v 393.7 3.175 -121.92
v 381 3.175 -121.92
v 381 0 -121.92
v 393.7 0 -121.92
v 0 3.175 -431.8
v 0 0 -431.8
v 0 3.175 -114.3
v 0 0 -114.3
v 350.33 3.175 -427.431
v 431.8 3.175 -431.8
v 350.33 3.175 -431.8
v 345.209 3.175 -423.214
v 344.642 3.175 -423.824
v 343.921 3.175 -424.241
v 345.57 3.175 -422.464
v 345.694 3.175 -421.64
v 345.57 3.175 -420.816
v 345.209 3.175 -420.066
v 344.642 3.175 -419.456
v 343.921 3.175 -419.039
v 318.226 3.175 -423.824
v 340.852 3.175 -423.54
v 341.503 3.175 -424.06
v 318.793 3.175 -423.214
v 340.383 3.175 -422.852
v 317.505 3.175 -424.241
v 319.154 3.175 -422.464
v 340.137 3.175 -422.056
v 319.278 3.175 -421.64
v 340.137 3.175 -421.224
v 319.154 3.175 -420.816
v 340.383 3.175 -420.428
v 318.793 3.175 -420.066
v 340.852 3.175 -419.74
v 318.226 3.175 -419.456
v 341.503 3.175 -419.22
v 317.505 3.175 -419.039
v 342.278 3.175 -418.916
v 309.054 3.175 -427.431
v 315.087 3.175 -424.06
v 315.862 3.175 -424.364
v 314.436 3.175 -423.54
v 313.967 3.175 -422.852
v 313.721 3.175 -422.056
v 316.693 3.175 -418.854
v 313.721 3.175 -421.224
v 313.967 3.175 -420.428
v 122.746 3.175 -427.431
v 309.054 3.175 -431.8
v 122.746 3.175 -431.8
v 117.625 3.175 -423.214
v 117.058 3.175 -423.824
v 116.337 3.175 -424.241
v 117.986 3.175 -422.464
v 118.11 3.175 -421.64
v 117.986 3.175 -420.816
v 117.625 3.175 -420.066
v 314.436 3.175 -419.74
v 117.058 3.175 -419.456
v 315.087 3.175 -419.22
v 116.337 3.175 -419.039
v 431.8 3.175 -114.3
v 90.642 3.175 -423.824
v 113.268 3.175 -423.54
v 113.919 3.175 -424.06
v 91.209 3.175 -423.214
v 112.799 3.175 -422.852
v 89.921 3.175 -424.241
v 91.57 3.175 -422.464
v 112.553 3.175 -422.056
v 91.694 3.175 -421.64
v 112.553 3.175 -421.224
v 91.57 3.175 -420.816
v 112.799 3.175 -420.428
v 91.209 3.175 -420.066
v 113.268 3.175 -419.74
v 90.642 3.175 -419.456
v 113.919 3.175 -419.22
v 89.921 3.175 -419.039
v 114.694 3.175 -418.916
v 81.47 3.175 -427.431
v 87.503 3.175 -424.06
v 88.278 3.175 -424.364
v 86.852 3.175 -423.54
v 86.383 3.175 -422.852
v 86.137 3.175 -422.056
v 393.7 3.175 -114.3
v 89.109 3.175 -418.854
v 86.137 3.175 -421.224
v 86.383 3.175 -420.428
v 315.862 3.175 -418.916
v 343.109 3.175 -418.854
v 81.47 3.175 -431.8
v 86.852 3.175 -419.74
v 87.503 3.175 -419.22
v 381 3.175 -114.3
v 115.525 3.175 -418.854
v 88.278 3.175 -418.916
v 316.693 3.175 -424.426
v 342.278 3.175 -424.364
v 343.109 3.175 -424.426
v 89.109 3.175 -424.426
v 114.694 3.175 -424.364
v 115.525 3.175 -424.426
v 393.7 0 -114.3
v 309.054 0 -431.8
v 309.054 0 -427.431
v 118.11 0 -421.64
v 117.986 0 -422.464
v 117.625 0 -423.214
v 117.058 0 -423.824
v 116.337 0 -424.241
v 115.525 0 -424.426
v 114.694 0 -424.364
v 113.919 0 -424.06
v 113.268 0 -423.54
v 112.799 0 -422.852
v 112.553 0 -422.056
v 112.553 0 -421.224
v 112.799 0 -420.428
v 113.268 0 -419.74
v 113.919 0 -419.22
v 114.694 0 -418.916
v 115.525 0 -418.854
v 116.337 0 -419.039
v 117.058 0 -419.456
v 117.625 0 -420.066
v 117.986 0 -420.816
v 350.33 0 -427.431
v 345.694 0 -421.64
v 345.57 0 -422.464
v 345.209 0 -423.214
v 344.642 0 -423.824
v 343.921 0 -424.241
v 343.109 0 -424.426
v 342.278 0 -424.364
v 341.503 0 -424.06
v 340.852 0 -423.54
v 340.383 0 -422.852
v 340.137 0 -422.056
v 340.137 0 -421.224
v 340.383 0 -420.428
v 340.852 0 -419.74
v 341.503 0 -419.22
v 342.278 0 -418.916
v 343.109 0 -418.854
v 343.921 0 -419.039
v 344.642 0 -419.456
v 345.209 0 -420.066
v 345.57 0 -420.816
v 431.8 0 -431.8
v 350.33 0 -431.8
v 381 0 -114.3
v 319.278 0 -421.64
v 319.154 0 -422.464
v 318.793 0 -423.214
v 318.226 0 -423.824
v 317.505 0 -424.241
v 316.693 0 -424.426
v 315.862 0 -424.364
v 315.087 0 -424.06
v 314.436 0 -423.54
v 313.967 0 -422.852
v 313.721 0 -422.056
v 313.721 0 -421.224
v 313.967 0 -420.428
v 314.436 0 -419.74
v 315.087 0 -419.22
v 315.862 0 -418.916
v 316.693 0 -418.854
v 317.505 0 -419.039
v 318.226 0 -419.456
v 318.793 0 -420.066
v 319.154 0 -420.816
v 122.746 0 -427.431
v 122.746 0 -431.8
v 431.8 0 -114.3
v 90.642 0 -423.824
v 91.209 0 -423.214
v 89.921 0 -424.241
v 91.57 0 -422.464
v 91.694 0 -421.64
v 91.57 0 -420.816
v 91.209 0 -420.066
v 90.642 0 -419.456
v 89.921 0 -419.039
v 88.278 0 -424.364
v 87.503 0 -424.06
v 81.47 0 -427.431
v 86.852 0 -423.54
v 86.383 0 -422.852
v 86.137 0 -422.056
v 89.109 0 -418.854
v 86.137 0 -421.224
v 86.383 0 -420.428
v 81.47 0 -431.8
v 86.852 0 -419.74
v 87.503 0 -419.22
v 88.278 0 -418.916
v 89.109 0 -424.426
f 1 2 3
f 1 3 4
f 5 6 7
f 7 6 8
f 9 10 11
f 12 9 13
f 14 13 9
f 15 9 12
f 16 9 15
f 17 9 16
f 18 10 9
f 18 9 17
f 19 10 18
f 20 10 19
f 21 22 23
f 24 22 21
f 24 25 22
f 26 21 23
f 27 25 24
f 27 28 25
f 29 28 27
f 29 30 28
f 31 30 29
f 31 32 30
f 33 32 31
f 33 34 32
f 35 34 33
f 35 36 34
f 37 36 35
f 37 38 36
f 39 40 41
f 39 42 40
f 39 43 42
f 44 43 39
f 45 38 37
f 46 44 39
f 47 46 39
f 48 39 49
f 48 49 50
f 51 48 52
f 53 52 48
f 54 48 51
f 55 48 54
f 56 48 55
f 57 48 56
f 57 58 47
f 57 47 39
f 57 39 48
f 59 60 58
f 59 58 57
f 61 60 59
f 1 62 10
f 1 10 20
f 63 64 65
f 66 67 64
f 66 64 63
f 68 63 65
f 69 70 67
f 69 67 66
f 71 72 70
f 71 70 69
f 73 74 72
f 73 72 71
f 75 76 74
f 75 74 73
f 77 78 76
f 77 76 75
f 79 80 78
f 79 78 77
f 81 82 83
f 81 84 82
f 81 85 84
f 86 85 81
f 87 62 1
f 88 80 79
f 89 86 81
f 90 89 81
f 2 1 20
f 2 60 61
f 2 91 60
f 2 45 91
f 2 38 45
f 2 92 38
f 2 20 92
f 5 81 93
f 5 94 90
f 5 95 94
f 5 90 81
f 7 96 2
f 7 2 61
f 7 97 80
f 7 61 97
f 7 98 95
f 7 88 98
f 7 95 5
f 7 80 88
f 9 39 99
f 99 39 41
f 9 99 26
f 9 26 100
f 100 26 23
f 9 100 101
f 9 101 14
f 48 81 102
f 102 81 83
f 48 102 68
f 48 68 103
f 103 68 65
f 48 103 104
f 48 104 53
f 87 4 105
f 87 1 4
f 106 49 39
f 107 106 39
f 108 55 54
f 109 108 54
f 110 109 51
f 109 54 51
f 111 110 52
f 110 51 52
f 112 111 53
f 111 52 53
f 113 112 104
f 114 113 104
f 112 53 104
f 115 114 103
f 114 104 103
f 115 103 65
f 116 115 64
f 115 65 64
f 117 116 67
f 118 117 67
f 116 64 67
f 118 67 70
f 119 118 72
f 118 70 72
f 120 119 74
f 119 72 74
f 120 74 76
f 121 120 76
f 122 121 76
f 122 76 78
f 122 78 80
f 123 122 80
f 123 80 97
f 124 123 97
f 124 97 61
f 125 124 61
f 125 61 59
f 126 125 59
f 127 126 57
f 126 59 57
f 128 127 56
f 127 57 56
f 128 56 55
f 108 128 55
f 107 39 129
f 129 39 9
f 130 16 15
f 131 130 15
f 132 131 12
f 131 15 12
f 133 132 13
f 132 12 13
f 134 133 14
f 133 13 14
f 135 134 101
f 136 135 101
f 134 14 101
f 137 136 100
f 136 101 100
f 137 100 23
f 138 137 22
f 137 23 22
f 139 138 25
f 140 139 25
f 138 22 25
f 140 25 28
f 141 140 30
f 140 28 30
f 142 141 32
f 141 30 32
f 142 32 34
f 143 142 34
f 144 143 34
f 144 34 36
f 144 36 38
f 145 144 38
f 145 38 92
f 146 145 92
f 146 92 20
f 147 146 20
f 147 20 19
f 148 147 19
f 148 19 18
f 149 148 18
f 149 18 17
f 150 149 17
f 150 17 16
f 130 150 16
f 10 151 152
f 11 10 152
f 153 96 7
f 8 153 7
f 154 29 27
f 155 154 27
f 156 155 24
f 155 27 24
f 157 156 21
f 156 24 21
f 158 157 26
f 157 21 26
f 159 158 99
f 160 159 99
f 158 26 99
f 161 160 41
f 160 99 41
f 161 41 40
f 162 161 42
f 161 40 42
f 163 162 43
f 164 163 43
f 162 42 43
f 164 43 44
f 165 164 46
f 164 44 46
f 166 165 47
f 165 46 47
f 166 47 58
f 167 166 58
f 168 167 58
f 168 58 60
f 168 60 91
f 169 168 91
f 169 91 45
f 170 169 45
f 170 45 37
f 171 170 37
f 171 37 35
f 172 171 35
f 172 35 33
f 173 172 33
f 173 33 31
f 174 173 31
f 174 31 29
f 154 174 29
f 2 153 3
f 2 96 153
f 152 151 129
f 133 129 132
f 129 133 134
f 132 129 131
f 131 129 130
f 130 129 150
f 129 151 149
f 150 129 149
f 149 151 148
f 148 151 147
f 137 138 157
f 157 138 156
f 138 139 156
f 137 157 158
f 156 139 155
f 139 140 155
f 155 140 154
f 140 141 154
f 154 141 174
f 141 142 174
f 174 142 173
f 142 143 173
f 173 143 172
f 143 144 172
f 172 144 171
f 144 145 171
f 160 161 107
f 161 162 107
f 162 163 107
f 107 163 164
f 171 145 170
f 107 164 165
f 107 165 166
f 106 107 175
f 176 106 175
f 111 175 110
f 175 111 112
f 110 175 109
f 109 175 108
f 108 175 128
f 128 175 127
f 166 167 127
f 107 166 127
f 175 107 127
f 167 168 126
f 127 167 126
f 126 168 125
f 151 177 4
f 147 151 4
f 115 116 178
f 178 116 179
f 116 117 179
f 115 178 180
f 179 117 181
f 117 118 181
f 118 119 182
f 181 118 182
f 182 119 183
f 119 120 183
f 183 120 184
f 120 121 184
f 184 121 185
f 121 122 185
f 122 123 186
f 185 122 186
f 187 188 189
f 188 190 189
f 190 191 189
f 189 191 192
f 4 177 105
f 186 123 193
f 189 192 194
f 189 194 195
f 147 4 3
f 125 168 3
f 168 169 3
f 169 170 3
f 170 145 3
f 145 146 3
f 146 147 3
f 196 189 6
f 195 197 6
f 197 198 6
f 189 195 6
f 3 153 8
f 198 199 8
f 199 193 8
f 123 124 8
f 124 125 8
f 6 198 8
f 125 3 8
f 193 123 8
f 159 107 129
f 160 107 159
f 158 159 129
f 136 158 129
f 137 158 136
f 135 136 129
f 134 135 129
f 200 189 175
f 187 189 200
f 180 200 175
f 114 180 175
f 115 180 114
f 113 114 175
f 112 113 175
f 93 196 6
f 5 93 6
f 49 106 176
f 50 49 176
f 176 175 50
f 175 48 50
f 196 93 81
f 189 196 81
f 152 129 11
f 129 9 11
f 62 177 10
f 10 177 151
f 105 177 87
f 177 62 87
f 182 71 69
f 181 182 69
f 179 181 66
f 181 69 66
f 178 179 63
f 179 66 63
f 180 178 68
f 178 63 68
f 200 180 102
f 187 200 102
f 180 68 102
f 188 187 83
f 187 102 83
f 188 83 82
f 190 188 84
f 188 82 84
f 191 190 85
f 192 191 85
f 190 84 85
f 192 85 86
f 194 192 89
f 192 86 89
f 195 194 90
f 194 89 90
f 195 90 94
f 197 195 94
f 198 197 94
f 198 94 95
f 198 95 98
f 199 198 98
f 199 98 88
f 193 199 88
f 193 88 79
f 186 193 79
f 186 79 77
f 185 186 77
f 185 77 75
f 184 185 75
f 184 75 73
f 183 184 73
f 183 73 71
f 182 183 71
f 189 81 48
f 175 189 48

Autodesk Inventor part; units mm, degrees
ref_plane "YZ Plane" through (0, 0, 0) normal (1, 0, 0) x (0, 1, 0)
ref_plane "XZ Plane" through (0, 0, 0) normal (0, 1, 0) x (-1, 0, 0)
ref_plane "XY Plane" through (0, 0, 0) normal (0, 0, 1) x (1, 0, 0)
sketch "Sketch1" plane through (0, 0, 0) normal (0, 1, 0) x (-1, 0, 0)
  line L0 (0, 0) -> (-431.8, 0)
  line L1 (-431.8, 0) -> (-431.8, -431.8)
  line L2 (-431.8, -431.8) -> (0, -431.8)
  line L3 (0, -431.8) -> (0, 0)
  dimension "d0" = 431.8
  dimension "d1" = 431.8
extrude "Extrusion1" add sketch "Sketch1" along normal blind 3.175
sketch "Sketch2" plane through (0, 3.175, 0) normal (0, 1, 0) x (1, 0, 0)
  line L0 (0, 431.8) -> (0, 0) projected
  line L1 (431.8, 0) -> (431.8, 431.8) projected
  circle A0 centre (386.08, 64.77) radius 6.35
  circle A1 centre (332.74, 64.77) radius 6.35
  circle A2 centre (279.4, 64.77) radius 6.35
  circle A3 centre (226.06, 64.77) radius 6.35
  circle A4 centre (172.72, 64.77) radius 6.35
  circle A5 centre (28.43, 92.2674) radius 1.5
  circle A6 centre (121.43, 92.2674) radius 1.5
  circle A7 centre (28.43, 37.2726) radius 1.5
  circle A8 centre (121.43, 37.2726) radius 1.5
  line L2 (26.43, 84.77) -> (123.43, 84.77)
  line L3 (123.43, 84.77) -> (123.43, 44.77)
  line L4 (123.43, 44.77) -> (26.43, 44.77)
  line L5 (26.43, 44.77) -> (26.43, 84.77)
  dimension "d14" = 12.7
  dimension "d15" = 12.7
  dimension "d16" = 12.7
  dimension "d17" = 12.7
  dimension "d18" = 12.7
extrude "Extrusion2" cut sketch "Sketch2" against normal blind 25.4
sketch "Sketch3" plane through (0, 3.175, 0) normal (0, 1, 0) x (1, 0, 0)
  circle A0 centre (88.9, 421.64) radius 2.794
  circle A1 centre (115.316, 421.64) radius 2.794
  circle A2 centre (316.484, 421.64) radius 2.794
  circle A3 centre (342.9, 421.64) radius 2.794
  line L0 (0, 431.8) -> (0, 0) projected
  line L1 (431.8, 0) -> (431.8, 431.8) projected
extrude "Extrusion3" cut sketch "Sketch3" along normal blind 25.4 and the other way blind 12.7
sketch "Sketch4" plane through (0, 0, 0) normal (0, -1, 0) x (1, 0, 0)
  circle A0 centre (386.08, -64.77) radius 6.35 projected
  circle A1 centre (386.08, -64.77) radius 7.62
  circle A2 centre (172.72, -64.77) radius 6.35 projected
  circle A3 centre (172.72, -64.77) radius 7.62
  circle A4 centre (226.06, -64.77) radius 6.35 projected
  circle A5 centre (226.06, -64.77) radius 7.62
  circle A6 centre (279.4, -64.77) radius 6.35 projected
  circle A7 centre (279.4, -64.77) radius 7.62
  circle A8 centre (332.74, -64.77) radius 6.35 projected
  circle A9 centre (332.74, -64.77) radius 7.62
  point P0 (0, 0)
  dimension "d50" = 15.24
  dimension "d51" = 15.24
  dimension "d52" = 15.24
  dimension "d53" = 15.24
  dimension "d54" = 15.24
extrude "Extrusion4" cut sketch "Sketch4" against normal blind 4.351 contours A0 | A1 | A2 | A3 | A4 | A5 | A6 | A7 | A8 | A9
sketch "Sketch5" plane through (0, 3.175, 0) normal (0, 1, 0) x (1, 0, 0)
  line L0 (0, 431.8) -> (431.8, 431.8)
  line L1 (431.8, 431.8) -> (431.8, 114.3)
  line L2 (431.8, 114.3) -> (0, 114.3)
  line L3 (0, 114.3) -> (0, 431.8)
  line L4 (0, 114.3) -> (431.8, 114.3)
  line L5 (0, -12.7) -> (0, 114.3)
  line L6 (0, -12.7) -> (0, 0)
  line L7 (431.8, 0) -> (431.8, 431.8) projected
  line L8 (0, 114.3) -> (431.8, 114.3)
  line L9 (431.8, 114.3) -> (431.8, 12.7)
  line L10 (431.8, 12.7) -> (0, 12.7)
  line L11 (0, 12.7) -> (0, 114.3)
  line L12 (0, 12.7) -> (431.8, 12.7)
  line L13 (431.8, 12.7) -> (431.8, 0)
  line L14 (431.8, 0) -> (0, 0)
  line L15 (0, 0) -> (0, 12.7)
  dimension "d57" = 317.5
  dimension "d59" = 101.6
extrude "Extrusion5" cut sketch "Sketch5" against normal blind 25.4 contours L2 L7 L10 L5 | L10 L7 L14 L5
sketch "Sketch7" plane through (0, 3.175, 0) normal (0, 1, 0) x (1, 0, 0)
  line L0 (431.8, 114.3) -> (431.8, 431.8) projected
  line L1 (393.7, 114.3) -> (381, 114.3)
  line L2 (381, 114.3) -> (381, 121.92)
  line L3 (381, 121.92) -> (393.7, 121.92)
  line L4 (393.7, 121.92) -> (393.7, 114.3)
  point P0 (0, 0)
  dimension "d63" = 12.7
  dimension "d64" = 7.62
extrude "Extrusion6" cut sketch "Sketch7" against normal blind 25.4
sketch "Sketch8" plane through (0, 3.175, 0) normal (0, 1, 0) x (1, 0, 0)
  point P0 (0, 0)
sketch "Sketch9" plane through (0, 3.175, 0) normal (0, 1, 0) x (1, 0, 0)
  circle A0 centre (88.9, 421.64) radius 2.794 projected
  circle A1 centre (342.9, 421.64) radius 2.794 projected
  point P0 (0, 0)
sketch "Sketch10" plane through (0, 3.175, 0) normal (0, 1, 0) x (1, 0, 0)
  circle A0 centre (115.316, 421.64) radius 2.794 projected
  line L0 (115.316, 421.64) -> (121.158, 421.64)
  line L1 (121.158, 421.64) -> (121.158, 431.8)
  line L2 (431.8, 431.8) -> (0, 431.8) projected
  line L3 (121.158, 431.8) -> (83.058, 431.8)
  line L4 (83.058, 431.8) -> (83.058, 421.64)
  circle A1 centre (88.9, 421.64) radius 2.794 projected
  line L5 (83.058, 421.64) -> (88.9, 421.64)
  circle A2 centre (342.9, 421.64) radius 2.794 projected
  line L6 (342.9, 421.64) -> (348.742, 421.64)
  line L7 (348.742, 421.64) -> (348.742, 431.8)
  line L8 (348.742, 431.8) -> (310.642, 431.8)
  line L9 (310.642, 431.8) -> (310.642, 421.64)
  circle A3 centre (316.484, 421.64) radius 2.794 projected
  line L10 (310.642, 421.64) -> (316.484, 421.64)
  line L11 (83.058, 431.8) -> (83.058, 429.26)
  line L12 (83.058, 429.26) -> (121.158, 429.26)
  line L13 (310.642, 431.8) -> (310.642, 429.26)
  line L14 (310.642, 429.26) -> (348.742, 429.26)
  point P0 (0, 0)
  dimension "d73" = 5.842
  dimension "d74" = 38.1
  dimension "d75" = 5.842
  dimension "d76" = 38.1
  dimension "d77" = 2.54
  dimension "d78" = 2.54
extrude "Extrusion7" cut sketch "Sketch10" against normal blind 25.4 contours L2 L7 L14 L9 | L12 L4 L2 L1
sketch "Sketch12" plane through (0, 3.175, 0) normal (0, 1, 0) x (1, 0, 0)
  line L0 (102.108, 431.8) -> (122.7455, 431.8)
  line L1 (310.642, 431.8) -> (121.158, 431.8) projected
  line L2 (102.108, 431.8) -> (81.4705, 431.8)
  line L3 (81.4705, 431.8) -> (81.4705, 429.26)
  line L4 (121.158, 429.26) -> (83.058, 429.26) projected
  line L5 (122.7455, 429.26) -> (122.7455, 431.8)
  line L6 (121.158, 429.26) -> (121.158, 431.8)
  line L7 (83.058, 431.8) -> (0, 431.8) projected
  line L8 (81.4705, 431.8) -> (81.4705, 427.4312)
  line L9 (81.4705, 427.4312) -> (122.7455, 427.4312)
  line L10 (122.7455, 427.4312) -> (122.7455, 429.26)
  line L11 (83.058, 429.26) -> (83.058, 427.4312)
  line L12 (121.158, 429.26) -> (121.158, 427.4312)
  line L13 (431.8, 431.8) -> (348.742, 431.8) projected
  line L14 (348.742, 431.8) -> (348.742, 434.6291)
  line L15 (329.692, 431.8) -> (350.3295, 431.8)
  line L16 (329.692, 431.8) -> (309.0545, 431.8)
  line L17 (309.0545, 431.8) -> (309.0545, 429.26)
  line L18 (350.3295, 429.26) -> (350.3295, 431.8)
  line L19 (348.742, 429.26) -> (348.742, 431.8)
  line L20 (309.0545, 431.8) -> (309.0545, 427.4312)
  line L21 (309.0545, 427.4312) -> (350.3295, 427.4312)
  line L22 (350.3295, 427.4312) -> (350.3295, 429.26)
  line L23 (310.642, 429.26) -> (310.642, 427.4312)
  line L24 (348.742, 429.26) -> (348.742, 427.4312)
  point P0 (0, 0)
  dimension "d84" = 20.6375
  dimension "d87" = 4.3688
  dimension "d89" = 4.3688
extrude "Extrusion8" cut sketch "Sketch12" against normal blind 25.4
properties part number "220207 Lid"
